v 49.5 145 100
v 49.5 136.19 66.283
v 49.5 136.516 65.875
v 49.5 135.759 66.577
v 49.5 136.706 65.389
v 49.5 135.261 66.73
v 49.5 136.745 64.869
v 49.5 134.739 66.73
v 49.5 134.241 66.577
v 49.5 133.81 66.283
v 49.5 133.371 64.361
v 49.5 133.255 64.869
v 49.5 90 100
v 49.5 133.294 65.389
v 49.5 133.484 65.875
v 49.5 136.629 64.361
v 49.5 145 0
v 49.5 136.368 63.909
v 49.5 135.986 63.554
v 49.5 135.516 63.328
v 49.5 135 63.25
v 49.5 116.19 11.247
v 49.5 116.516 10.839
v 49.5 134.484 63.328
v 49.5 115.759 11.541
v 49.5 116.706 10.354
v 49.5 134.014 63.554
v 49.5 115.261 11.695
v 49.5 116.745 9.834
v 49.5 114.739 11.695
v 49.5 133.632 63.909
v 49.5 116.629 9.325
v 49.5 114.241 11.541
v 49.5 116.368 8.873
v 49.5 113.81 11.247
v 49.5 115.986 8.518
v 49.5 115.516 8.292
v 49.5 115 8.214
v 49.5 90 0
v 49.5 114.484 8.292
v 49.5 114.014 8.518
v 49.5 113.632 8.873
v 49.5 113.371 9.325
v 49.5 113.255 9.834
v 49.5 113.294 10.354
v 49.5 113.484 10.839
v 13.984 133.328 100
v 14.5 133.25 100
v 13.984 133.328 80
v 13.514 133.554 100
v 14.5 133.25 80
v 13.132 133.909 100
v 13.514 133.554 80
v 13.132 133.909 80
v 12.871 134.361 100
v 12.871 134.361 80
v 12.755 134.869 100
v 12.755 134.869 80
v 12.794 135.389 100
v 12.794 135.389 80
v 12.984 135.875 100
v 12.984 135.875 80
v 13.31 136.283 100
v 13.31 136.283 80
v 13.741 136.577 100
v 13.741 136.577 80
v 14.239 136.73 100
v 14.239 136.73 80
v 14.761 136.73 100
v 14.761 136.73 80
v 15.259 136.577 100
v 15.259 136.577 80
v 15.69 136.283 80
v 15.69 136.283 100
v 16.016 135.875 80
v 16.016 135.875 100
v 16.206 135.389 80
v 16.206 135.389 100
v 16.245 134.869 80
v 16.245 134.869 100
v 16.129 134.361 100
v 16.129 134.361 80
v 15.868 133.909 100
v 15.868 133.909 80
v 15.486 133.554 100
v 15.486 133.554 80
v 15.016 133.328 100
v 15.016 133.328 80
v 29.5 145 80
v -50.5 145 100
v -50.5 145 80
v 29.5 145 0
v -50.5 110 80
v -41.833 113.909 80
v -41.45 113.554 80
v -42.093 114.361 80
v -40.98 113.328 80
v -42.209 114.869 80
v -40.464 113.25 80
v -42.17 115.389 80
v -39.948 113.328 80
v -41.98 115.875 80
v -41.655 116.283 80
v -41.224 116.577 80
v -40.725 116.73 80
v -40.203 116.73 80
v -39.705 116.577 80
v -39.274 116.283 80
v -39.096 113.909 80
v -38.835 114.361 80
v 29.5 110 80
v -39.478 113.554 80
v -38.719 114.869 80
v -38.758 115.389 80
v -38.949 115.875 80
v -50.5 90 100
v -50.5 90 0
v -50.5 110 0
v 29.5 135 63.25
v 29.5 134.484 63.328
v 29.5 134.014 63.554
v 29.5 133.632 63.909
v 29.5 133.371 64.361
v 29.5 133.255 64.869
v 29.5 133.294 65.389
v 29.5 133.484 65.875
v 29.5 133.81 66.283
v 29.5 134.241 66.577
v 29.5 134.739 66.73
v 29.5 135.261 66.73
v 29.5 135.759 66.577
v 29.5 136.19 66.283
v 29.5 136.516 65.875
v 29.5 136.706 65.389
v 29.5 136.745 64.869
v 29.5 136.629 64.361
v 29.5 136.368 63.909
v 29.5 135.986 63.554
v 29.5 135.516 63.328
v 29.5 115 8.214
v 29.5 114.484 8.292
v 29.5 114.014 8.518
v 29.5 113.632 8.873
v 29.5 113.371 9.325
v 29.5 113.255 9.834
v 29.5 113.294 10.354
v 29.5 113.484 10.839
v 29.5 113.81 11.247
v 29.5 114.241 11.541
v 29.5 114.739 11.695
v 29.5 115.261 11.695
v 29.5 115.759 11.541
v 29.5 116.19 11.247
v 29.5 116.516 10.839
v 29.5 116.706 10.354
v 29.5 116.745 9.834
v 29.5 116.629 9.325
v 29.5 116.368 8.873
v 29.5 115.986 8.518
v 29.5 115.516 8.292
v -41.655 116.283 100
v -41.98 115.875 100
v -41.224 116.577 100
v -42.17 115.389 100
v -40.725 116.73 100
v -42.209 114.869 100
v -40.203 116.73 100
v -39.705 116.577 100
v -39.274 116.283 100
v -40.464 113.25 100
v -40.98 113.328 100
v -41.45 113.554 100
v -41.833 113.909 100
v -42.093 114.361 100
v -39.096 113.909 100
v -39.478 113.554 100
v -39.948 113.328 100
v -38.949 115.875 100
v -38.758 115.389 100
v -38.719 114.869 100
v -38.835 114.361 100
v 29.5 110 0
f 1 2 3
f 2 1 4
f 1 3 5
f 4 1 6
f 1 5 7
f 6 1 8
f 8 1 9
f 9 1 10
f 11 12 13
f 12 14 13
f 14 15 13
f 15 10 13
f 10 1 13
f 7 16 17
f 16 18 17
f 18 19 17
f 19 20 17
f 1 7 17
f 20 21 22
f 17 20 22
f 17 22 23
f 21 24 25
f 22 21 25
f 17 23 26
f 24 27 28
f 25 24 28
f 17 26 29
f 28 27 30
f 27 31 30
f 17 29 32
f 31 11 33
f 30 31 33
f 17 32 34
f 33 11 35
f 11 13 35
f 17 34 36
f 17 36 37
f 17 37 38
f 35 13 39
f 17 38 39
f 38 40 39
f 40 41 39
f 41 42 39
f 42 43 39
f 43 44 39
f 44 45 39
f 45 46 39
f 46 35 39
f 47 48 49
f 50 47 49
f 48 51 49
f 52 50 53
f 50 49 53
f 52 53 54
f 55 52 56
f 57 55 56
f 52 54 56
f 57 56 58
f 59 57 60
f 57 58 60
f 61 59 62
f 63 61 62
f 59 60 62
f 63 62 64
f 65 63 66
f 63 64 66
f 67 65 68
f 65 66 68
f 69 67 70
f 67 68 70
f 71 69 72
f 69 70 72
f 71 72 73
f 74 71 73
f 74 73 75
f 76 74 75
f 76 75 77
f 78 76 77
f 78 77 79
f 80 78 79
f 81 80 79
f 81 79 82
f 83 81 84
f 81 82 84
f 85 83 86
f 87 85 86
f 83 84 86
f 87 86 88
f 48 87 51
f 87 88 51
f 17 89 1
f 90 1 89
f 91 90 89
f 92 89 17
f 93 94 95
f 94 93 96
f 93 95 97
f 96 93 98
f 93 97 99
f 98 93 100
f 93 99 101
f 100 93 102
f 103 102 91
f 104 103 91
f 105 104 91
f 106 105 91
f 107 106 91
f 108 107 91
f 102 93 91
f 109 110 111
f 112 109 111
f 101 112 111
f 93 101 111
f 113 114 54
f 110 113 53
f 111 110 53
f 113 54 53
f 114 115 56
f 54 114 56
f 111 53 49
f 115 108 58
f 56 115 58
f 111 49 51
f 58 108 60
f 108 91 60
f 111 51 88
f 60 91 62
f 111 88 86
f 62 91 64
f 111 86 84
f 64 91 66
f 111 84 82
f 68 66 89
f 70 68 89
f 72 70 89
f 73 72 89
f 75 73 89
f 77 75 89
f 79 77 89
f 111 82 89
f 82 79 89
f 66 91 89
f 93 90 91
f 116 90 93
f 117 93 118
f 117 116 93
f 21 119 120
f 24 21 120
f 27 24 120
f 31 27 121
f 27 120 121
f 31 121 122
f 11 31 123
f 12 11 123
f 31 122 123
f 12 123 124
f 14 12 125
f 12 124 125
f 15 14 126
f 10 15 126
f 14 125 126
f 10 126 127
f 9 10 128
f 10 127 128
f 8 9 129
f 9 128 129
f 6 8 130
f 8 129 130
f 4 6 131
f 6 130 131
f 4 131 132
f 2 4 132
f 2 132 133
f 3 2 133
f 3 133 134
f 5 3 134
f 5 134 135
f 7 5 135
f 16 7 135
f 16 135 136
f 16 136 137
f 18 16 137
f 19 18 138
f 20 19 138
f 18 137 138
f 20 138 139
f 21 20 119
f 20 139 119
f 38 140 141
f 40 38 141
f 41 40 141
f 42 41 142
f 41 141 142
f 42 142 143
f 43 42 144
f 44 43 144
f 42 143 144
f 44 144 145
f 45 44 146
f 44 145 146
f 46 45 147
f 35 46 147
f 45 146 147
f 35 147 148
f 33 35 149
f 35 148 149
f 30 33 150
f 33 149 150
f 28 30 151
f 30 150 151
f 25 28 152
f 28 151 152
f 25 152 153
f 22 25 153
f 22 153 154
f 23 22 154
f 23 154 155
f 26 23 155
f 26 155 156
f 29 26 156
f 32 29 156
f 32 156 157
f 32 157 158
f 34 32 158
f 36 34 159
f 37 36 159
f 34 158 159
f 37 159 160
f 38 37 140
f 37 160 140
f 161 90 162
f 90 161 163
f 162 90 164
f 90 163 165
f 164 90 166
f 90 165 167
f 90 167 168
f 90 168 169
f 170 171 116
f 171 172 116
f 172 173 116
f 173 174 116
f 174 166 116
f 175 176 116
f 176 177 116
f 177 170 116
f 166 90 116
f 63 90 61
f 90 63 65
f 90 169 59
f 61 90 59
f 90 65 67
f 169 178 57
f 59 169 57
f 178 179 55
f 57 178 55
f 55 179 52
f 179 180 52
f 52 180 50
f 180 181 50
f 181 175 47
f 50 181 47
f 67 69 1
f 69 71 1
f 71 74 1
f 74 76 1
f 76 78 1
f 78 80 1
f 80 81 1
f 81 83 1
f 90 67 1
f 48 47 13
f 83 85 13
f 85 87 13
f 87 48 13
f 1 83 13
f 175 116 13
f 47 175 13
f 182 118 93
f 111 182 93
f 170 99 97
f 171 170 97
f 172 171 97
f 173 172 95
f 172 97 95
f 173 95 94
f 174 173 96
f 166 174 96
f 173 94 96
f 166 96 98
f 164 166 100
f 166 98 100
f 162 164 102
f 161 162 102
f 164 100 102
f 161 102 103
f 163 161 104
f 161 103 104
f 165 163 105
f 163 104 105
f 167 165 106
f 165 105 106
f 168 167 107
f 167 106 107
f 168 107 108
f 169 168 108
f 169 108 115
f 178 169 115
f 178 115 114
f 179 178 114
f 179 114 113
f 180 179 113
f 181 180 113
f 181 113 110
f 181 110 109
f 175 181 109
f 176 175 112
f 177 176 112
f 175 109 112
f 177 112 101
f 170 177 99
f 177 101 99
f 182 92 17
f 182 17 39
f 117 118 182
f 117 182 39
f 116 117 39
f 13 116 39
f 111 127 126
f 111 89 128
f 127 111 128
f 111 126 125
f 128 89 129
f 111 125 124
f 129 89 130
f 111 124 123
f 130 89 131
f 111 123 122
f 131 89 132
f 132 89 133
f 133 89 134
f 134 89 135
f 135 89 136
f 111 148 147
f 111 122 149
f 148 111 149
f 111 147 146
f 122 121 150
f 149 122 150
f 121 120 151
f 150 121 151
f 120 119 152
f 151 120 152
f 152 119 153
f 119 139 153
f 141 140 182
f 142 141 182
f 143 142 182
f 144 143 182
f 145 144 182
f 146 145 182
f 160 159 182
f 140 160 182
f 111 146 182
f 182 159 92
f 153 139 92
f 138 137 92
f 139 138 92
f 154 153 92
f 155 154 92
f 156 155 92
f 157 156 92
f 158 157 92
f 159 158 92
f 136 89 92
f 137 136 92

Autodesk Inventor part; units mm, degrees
ref_plane "YZ Plane" through (0, 0, 0) normal (1, 0, 0) x (0, 1, 0)
ref_plane "XZ Plane" through (0, 0, 0) normal (0, 1, 0) x (-1, 0, 0)
ref_plane "XY Plane" through (0, 0, 0) normal (0, 0, 1) x (1, 0, 0)
sketch "Boceto2" plane through (0, 0, 0) normal (0, 1, 0) x (-1, 0, 0)
  line L0 (7.5, 100) -> (-7.5, 100)
  line L1 (-7.5, 100) -> (-7.5, -100)
  line L2 (-7.5, -100) -> (7.5, -100)
  line L3 (7.5, -100) -> (7.5, 100)
  line L4 (7.5, 100) -> (-7.5, -100) construction
  line L5 (-7.5, 100) -> (7.5, -100) construction
  point P0 (0, 0)
  dimension "d7" = 15
  dimension "d8" = 200
extrude "Extrusión1" add sketch "Boceto2" along normal blind 10
sketch "Boceto3" plane through (0, 10, 0) normal (0, 1, 0) x (1, 0, 0)
  circle A0 centre (3.25, 58.25) radius 1.75
  line L0 (5, 50) -> (-5, 50)
  line L1 (-5, 50) -> (-5, 60)
  line L2 (-5, 60) -> (5, 60)
  line L3 (5, 60) -> (5, 50)
  line L4 (5, 50) -> (-5, 60) construction
  line L5 (-5, 50) -> (5, 60) construction
  circle A1 centre (-3.25, 51.75) radius 1.75
  line L6 (7.5, 100) -> (-7.5, 100) projected
  line L7 (-7.5, 0) -> (3.408, 0)
  line L8 (5, -60) -> (5, -50)
  line L9 (-5, -60) -> (5, -60)
  line L10 (5, -50) -> (-5, -50)
  line L11 (-5, -50) -> (-5, -60)
  line L12 (-5, -50) -> (5, -60) construction
  circle A2 centre (-3.25, -51.75) radius 1.75
  line L13 (5, -50) -> (-5, -60) construction
  circle A3 centre (3.25, -58.25) radius 1.75
  line L14 (-7.5, -100) -> (7.5, -100) projected
  point P0 (0, 0)
  point P1 (-5, 55)
  point P2 (0, 100)
  point P3 (-5, -55)
  dimension "d11" = 3.5
  dimension "d12" = 1.75
  dimension "d13" = 1.75
  dimension "d14" = 1.75
  dimension "d15" = 1.75
  dimension "d16" = 10
  dimension "d17" = 10
  dimension "d19" = 40
  dimension "d81" = 40
hole "Agujero1" at (3.25, 10, 58.25) at (-3.25, 10, 51.75) at (3.25, 10, -58.25) at (-3.25, 10, -51.75) direction (0, -1, 0) diameter 3.5 end through all
sketch "Boceto4" plane through (0, 10, 0) normal (0, 1, 0) x (1, 0, 0)
  line L0 (-7.5, 100) -> (-7.5, -100) projected
  line L1 (-7.5, -100) -> (7.5, -100)
  line L2 (7.5, -100) -> (7.5, -80)
  line L3 (7.5, -80) -> (-7.5, -80)
  line L4 (-7.5, -80) -> (-7.5, -100)
  line L5 (-7.5, 0) -> (1.0116, 0)
  line L6 (-7.5, -100) -> (-7.5, 100)
  line L7 (-7.5, 100) -> (7.5, 100)
  line L8 (7.5, 100) -> (7.5, 80)
  line L9 (7.5, 80) -> (-7.5, 80)
  line L10 (-7.5, 80) -> (-7.5, 100)
  point P0 (0, 0)
  point P1 (-7.5, -80)
  point P2 (-7.5, 80)
  dimension "d27" = 15
  dimension "d28" = 20
extrude "Extrusión2" add sketch "Boceto4" along normal blind 80
sketch "Boceto5" plane through (0, 90, 0) normal (0, 1, 0) x (1, 0, 0)
  line L0 (-7.5, -100) -> (7.5, -100) projected
  line L1 (-7.5, -100) -> (49.5, -100)
  line L2 (49.5, -100) -> (49.5, 100)
  line L3 (49.5, 100) -> (-7.5, 100)
  line L4 (-7.5, 100) -> (-7.5, -100)
  line L5 (49.5, -100) -> (-150.5, -100)
  line L6 (-150.5, -100) -> (-150.5, 100)
  line L7 (-150.5, 100) -> (49.5, 100)
  line L8 (49.5, 100) -> (49.5, -100)
  point P0 (0, 0)
  point P1 (-7.5, 100)
  dimension "d31" = 57
  dimension "d32" = 200
  dimension "d75" = 200
extrude "Extrusión3" add sketch "Boceto5" along normal blind 110
sketch "Boceto6" plane through (0, 200, 0) normal (0, 1, 0) x (1, 0, 0)
  line L0 (49.5, 100) -> (7.5, 100) projected
  line L1 (49.5, 100) -> (29.5, 100)
  line L2 (29.5, 100) -> (29.5, 80)
  line L3 (7.5, -100) -> (49.5, -100) projected
  line L4 (28.5, -100) -> (28.5, -80)
  line L5 (-150.5, 100) -> (-150.5, -100) projected
  line L6 (29.5, 80) -> (-150.5, 80)
  line L7 (-150.5, 80) -> (-150.5, -80)
  line L8 (-150.5, -80) -> (29.5, -80)
  line L9 (29.5, -80) -> (29.5, 80)
  line L10 (-150.5, -100) -> (49.5, -100) projected
  point P0 (7.5, 80)
  point P1 (-50.5, -100)
  dimension "d36" = 20
  dimension "d37" = 20
  dimension "d38" = 20
  dimension "d77" = 20
extrude "Extrusión4" cut sketch "Boceto6" against normal blind 90 contours L8 L5 L6 L9
sketch "Boceto7" plane through (-150.5, 90, -100) normal (-1, 0, 0) x (0, 0, 1)
  line L0 (0, 110) -> (20, 110) projected
  line L1 (20, 110) -> (10, 110)
  line L2 (10, 110) -> (10, 20)
  line L3 (10, 20) -> (20, 20)
  line L4 (20, 20) -> (20, 110)
  line L5 (180, 110) -> (180, 20) projected
  line L6 (180, 110) -> (190, 110)
  line L7 (190, 110) -> (190, 20)
  line L8 (190, 20) -> (180, 20)
  line L9 (180, 20) -> (180, 110)
  line L10 (200, 0) -> (200, 110) projected
  line L11 (0, 0) -> (0, 110) projected
  line L12 (0, 110) -> (10, 110)
  line L13 (10, 110) -> (10, 20)
  line L14 (10, 20) -> (0, 20)
  line L15 (0, 20) -> (0, 110)
  line L16 (200, 110) -> (0, 110) projected
  line L17 (200, 110) -> (190, 110)
  line L18 (190, 110) -> (190, 20)
  line L19 (190, 20) -> (200, 20)
  line L20 (200, 20) -> (200, 110)
  point P0 (100, -90)
  dimension "d63" = 10
  dimension "d65" = 10
  dimension "d76" = 10
extrude "Extrusión5" cut sketch "Boceto7" against normal blind 30 contours L6 L7 L8 L5 | L0 L4 L3 L2
sketch "Boceto8" plane through (-7.5, 0, 100) normal (0, 0, 1) x (1, 0, 0)
  line L0 (-113, 110) -> (-113, 200) projected
  line L1 (-113, 200) -> (-113, 110)
  circle A0 centre (-124.75, 183.25) radius 1.75
  line L2 (-123, 175) -> (-133, 175)
  line L3 (-133, 175) -> (-133, 185)
  line L4 (-133, 185) -> (-123, 185)
  line L5 (-123, 185) -> (-123, 175)
  line L6 (-123, 175) -> (-133, 185) construction
  line L7 (-133, 175) -> (-123, 185) construction
  circle A1 centre (-131.25, 176.75) radius 1.75
  line L8 (-143, 200) -> (57, 200) projected
  line L9 (-143, 90) -> (-143, 200) projected
  line L10 (-113, 155) -> (-128, 155)
  line L11 (-123, 125) -> (-123, 135)
  line L12 (-133, 125) -> (-123, 125)
  line L13 (-123, 135) -> (-133, 125) construction
  line L14 (-123, 135) -> (-133, 135)
  line L15 (-133, 135) -> (-123, 125) construction
  circle A2 centre (-131.25, 133.25) radius 1.75
  line L16 (-133, 135) -> (-133, 125)
  circle A3 centre (-124.75, 126.75) radius 1.75
  line L17 (-143, 110) -> (-113, 110) projected
  point P0 (7.5, 0)
  point P1 (-133, 180)
  point P2 (-123, 180)
  point P3 (-133, 130)
  point P4 (-123, 130)
  dimension "d45" = 3.5
  dimension "d46" = 1.75
  dimension "d47" = 1.75
  dimension "d48" = 1.75
  dimension "d49" = 1.75
  dimension "d50" = 10
  dimension "d51" = 10
  dimension "d52" = 15
  dimension "d53" = 10
  dimension "d54" = 10
  dimension "d55" = 15
hole "Agujero2" at (-132.25, 183.25, 100) at (-138.75, 176.75, 100) at (-138.75, 133.25, 100) at (-132.25, 126.75, 100) direction (0, 0, -1) diameter 3.5 end through all
ref_plane "Plano de trabajo1" through (-150.5, 90, 100) normal (0, -1, 0) x (1, 0, 0)
split "Dividir1" plane through (-150.5, 90, 100) removes the side toward (0, -1, 0)
ref_plane "Plano de trabajo2" through (49.5, 90, 0) normal (0, 0, -1) x (-1, 0, 0)
ref_plane "Plano de trabajo3" through (-50.5, 90, 100) normal (1, 0, 0) x (0, 0, -1)
ref_plane "Plano de trabajo4" through (0, 145, 0) normal (0, 1, 0) x (1, 0, 0)
sketch "Boceto9" plane through (-150.5, 90, 100) normal (0, 0, 1) x (1, 0, 0)
  line L0 (85.0357, 30) -> (115.0357, 30)
  circle A0 centre (110.0357, 25) radius 1.75
  line L1 (90.0357, 25) -> (110.0357, 25)
  line L2 (115.0357, 30) -> (115.0357, 20)
  circle A1 centre (90.0357, 25) radius 1.75
  line L3 (85.0357, 20) -> (115.0357, 30) construction
  line L4 (85.0357, 30) -> (115.0357, 20) construction
  line L5 (85.0357, 20) -> (85.0357, 30)
  line L6 (115.0357, 20) -> (85.0357, 20)
  line L7 (200, 0) -> (200, 110)
  line L8 (200, 55) -> (88.2857, 55)
  circle A2 centre (90.0357, 85) radius 1.75
  line L9 (85.0357, 80) -> (115.0357, 80)
  line L10 (85.0357, 80) -> (115.0357, 90) construction
  line L11 (85.0357, 90) -> (85.0357, 80)
  line L12 (115.0357, 90) -> (85.0357, 90)
  line L13 (85.0357, 90) -> (115.0357, 80) construction
  circle A3 centre (110.0357, 85) radius 1.75
  line L14 (90.0357, 85) -> (110.0357, 85)
  line L15 (115.0357, 80) -> (115.0357, 90)
  line L16 (100.0357, 55) -> (185.099, 55) construction
  line L17 (160, 70) -> (160, 40)
  circle A4 centre (165, 45) radius 1.75
  line L18 (170, 40) -> (170, 70)
  line L19 (170, 70) -> (160, 40) construction
  line L20 (160, 40) -> (170, 40)
  line L21 (160, 70) -> (170, 40) construction
  circle A5 centre (165, 65) radius 1.75
  line L22 (165, 65) -> (165, 45)
  line L23 (170, 70) -> (160, 70)
  circle A6 centre (55, 65) radius 1.75
  line L24 (60, 70) -> (60, 40)
  line L25 (60, 40) -> (50, 40)
  circle A7 centre (55, 45) radius 1.75
  line L26 (55, 65) -> (55, 45)
  line L27 (60, 70) -> (50, 40) construction
  line L28 (50, 40) -> (50, 70)
  line L29 (50, 70) -> (60, 40) construction
  line L30 (50, 70) -> (60, 70)
  line L31 (30, 110) -> (30, 20)
  point P0 (150.5, -90)
  point P1 (100.0357, 34.7141)
  point P2 (100.0357, 34.7141)
  point P3 (85.0357, 36.6749)
  point P4 (115.0357, 25)
  point P5 (115.0357, 85)
  point P6 (189.1833, 40)
  point P7 (165, 70)
  point P8 (70.0357, 40)
  point P9 (55, 70)
  dimension "d89" = 10
  dimension "d90" = 30
  dimension "d91" = 5
  dimension "d92" = 5
  dimension "d93" = 5
  dimension "d94" = 5
  dimension "d95" = 30
  dimension "d96" = 5
  dimension "d97" = 5
  dimension "d98" = 3.5
  dimension "d99" = 5
  dimension "d100" = 5
  dimension "d101" = 5
  dimension "d102" = 5
  dimension "d103" = 5
  dimension "d104" = 20
hole "Agujero3" at (-60.4643, 175, 100) at (-40.4643, 175, 100) at (14.5, 155, 100) at (-95.5, 155, 100) at (-95.5, 135, 100) at (-60.4643, 115, 100) at (-40.4643, 115, 100) at (14.5, 135, 100) direction (0, 0, -1) diameter 3.5 end through all
sketch "Boceto10" plane through (49.5, 90, 100) normal (1, 0, 0) x (0, 0, -1)
  line L0 (85.0357, 30) -> (115.0357, 30)
  circle A0 centre (110.0357, 25) radius 1.75
  line L1 (90.0357, 25) -> (110.0357, 25)
  line L2 (115.0357, 30) -> (115.0357, 20)
  circle A1 centre (90.0357, 25) radius 1.75
  line L3 (85.0357, 30) -> (115.0357, 20) construction
  line L4 (85.0357, 20) -> (85.0357, 30)
  line L5 (115.0357, 20) -> (85.0357, 20)
  line L6 (85.0357, 20) -> (115.0357, 30) construction
  line L7 (160, 70) -> (160, 40)
  circle A2 centre (165, 45) radius 1.75
  line L8 (160, 40) -> (170, 40)
  line L9 (165, 65) -> (165, 45)
  circle A3 centre (165, 65) radius 1.75
  line L10 (170, 70) -> (160, 40) construction
  line L11 (170, 70) -> (160, 70)
  line L12 (160, 70) -> (170, 40) construction
  line L13 (170, 40) -> (170, 70)
  line L14 (40, 70) -> (40, 40)
  line L15 (35, 65) -> (35, 45)
  circle A4 centre (35, 65) radius 1.75
  line L16 (40, 40) -> (30, 40)
  line L17 (40, 70) -> (30, 40) construction
  line L18 (30, 70) -> (40, 40) construction
  line L19 (30, 70) -> (40, 70)
  line L20 (30, 40) -> (30, 70)
  circle A5 centre (35, 45) radius 1.75
  circle A6 centre (90.0357, 85) radius 1.75
  line L21 (85.0357, 80) -> (115.0357, 80)
  line L22 (115.0357, 80) -> (115.0357, 90)
  circle A7 centre (110.0357, 85) radius 1.75
  line L23 (90.0357, 85) -> (110.0357, 85)
  line L24 (85.0357, 80) -> (115.0357, 90) construction
  line L25 (85.0357, 90) -> (85.0357, 80)
  line L26 (115.0357, 90) -> (85.0357, 90)
  line L27 (85.0357, 90) -> (115.0357, 80) construction
  line L28 (0, 0) -> (0, 110)
  line L29 (200, 0) -> (200, 110)
  point P0 (100, -90)
  point P1 (100.0357, 34.7141)
  point P2 (100.0357, 34.7141)
  point P3 (85.0357, 36.6749)
  point P4 (115.0357, 25)
  point P5 (88.2857, 55)
  point P6 (189.1833, 40)
  point P7 (165, 70)
  point P8 (70.0357, 40)
  point P9 (35, 70)
  point P10 (115.0357, 85)
  point P11 (100.0357, 55)
  dimension "d112" = 10
  dimension "d113" = 30
  dimension "d114" = 5
  dimension "d115" = 5
  dimension "d116" = 5
  dimension "d117" = 5
  dimension "d118" = 5
  dimension "d119" = 5
  dimension "d120" = 3.5
  dimension "d121" = 5
  dimension "d122" = 5
  dimension "d123" = 5
  dimension "d124" = 5
  dimension "d125" = 5
  dimension "d126" = 30
  dimension "d127" = 30
hole "Agujero4" at (49.5, 175, 9.9643) at (49.5, 175, -10.0357) at (49.5, 155, 65) at (49.5, 135, 65) at (49.5, 115, 9.9643) at (49.5, 115, -10.0357) at (49.5, 135, -65) at (49.5, 155, -65) direction (-1, 0, 0) diameter 3.5 end through all
split "Dividir2" plane through (-50.5, 90, 100) removes the side toward (-1, 0, 0)
split "Dividir3" plane through (0, 145, 0) removes the side toward (0, 1, 0)
split "Dividir4" plane through (49.5, 90, 0) removes the side toward (0, 0, -1)
properties part number "container_front_head_2"
